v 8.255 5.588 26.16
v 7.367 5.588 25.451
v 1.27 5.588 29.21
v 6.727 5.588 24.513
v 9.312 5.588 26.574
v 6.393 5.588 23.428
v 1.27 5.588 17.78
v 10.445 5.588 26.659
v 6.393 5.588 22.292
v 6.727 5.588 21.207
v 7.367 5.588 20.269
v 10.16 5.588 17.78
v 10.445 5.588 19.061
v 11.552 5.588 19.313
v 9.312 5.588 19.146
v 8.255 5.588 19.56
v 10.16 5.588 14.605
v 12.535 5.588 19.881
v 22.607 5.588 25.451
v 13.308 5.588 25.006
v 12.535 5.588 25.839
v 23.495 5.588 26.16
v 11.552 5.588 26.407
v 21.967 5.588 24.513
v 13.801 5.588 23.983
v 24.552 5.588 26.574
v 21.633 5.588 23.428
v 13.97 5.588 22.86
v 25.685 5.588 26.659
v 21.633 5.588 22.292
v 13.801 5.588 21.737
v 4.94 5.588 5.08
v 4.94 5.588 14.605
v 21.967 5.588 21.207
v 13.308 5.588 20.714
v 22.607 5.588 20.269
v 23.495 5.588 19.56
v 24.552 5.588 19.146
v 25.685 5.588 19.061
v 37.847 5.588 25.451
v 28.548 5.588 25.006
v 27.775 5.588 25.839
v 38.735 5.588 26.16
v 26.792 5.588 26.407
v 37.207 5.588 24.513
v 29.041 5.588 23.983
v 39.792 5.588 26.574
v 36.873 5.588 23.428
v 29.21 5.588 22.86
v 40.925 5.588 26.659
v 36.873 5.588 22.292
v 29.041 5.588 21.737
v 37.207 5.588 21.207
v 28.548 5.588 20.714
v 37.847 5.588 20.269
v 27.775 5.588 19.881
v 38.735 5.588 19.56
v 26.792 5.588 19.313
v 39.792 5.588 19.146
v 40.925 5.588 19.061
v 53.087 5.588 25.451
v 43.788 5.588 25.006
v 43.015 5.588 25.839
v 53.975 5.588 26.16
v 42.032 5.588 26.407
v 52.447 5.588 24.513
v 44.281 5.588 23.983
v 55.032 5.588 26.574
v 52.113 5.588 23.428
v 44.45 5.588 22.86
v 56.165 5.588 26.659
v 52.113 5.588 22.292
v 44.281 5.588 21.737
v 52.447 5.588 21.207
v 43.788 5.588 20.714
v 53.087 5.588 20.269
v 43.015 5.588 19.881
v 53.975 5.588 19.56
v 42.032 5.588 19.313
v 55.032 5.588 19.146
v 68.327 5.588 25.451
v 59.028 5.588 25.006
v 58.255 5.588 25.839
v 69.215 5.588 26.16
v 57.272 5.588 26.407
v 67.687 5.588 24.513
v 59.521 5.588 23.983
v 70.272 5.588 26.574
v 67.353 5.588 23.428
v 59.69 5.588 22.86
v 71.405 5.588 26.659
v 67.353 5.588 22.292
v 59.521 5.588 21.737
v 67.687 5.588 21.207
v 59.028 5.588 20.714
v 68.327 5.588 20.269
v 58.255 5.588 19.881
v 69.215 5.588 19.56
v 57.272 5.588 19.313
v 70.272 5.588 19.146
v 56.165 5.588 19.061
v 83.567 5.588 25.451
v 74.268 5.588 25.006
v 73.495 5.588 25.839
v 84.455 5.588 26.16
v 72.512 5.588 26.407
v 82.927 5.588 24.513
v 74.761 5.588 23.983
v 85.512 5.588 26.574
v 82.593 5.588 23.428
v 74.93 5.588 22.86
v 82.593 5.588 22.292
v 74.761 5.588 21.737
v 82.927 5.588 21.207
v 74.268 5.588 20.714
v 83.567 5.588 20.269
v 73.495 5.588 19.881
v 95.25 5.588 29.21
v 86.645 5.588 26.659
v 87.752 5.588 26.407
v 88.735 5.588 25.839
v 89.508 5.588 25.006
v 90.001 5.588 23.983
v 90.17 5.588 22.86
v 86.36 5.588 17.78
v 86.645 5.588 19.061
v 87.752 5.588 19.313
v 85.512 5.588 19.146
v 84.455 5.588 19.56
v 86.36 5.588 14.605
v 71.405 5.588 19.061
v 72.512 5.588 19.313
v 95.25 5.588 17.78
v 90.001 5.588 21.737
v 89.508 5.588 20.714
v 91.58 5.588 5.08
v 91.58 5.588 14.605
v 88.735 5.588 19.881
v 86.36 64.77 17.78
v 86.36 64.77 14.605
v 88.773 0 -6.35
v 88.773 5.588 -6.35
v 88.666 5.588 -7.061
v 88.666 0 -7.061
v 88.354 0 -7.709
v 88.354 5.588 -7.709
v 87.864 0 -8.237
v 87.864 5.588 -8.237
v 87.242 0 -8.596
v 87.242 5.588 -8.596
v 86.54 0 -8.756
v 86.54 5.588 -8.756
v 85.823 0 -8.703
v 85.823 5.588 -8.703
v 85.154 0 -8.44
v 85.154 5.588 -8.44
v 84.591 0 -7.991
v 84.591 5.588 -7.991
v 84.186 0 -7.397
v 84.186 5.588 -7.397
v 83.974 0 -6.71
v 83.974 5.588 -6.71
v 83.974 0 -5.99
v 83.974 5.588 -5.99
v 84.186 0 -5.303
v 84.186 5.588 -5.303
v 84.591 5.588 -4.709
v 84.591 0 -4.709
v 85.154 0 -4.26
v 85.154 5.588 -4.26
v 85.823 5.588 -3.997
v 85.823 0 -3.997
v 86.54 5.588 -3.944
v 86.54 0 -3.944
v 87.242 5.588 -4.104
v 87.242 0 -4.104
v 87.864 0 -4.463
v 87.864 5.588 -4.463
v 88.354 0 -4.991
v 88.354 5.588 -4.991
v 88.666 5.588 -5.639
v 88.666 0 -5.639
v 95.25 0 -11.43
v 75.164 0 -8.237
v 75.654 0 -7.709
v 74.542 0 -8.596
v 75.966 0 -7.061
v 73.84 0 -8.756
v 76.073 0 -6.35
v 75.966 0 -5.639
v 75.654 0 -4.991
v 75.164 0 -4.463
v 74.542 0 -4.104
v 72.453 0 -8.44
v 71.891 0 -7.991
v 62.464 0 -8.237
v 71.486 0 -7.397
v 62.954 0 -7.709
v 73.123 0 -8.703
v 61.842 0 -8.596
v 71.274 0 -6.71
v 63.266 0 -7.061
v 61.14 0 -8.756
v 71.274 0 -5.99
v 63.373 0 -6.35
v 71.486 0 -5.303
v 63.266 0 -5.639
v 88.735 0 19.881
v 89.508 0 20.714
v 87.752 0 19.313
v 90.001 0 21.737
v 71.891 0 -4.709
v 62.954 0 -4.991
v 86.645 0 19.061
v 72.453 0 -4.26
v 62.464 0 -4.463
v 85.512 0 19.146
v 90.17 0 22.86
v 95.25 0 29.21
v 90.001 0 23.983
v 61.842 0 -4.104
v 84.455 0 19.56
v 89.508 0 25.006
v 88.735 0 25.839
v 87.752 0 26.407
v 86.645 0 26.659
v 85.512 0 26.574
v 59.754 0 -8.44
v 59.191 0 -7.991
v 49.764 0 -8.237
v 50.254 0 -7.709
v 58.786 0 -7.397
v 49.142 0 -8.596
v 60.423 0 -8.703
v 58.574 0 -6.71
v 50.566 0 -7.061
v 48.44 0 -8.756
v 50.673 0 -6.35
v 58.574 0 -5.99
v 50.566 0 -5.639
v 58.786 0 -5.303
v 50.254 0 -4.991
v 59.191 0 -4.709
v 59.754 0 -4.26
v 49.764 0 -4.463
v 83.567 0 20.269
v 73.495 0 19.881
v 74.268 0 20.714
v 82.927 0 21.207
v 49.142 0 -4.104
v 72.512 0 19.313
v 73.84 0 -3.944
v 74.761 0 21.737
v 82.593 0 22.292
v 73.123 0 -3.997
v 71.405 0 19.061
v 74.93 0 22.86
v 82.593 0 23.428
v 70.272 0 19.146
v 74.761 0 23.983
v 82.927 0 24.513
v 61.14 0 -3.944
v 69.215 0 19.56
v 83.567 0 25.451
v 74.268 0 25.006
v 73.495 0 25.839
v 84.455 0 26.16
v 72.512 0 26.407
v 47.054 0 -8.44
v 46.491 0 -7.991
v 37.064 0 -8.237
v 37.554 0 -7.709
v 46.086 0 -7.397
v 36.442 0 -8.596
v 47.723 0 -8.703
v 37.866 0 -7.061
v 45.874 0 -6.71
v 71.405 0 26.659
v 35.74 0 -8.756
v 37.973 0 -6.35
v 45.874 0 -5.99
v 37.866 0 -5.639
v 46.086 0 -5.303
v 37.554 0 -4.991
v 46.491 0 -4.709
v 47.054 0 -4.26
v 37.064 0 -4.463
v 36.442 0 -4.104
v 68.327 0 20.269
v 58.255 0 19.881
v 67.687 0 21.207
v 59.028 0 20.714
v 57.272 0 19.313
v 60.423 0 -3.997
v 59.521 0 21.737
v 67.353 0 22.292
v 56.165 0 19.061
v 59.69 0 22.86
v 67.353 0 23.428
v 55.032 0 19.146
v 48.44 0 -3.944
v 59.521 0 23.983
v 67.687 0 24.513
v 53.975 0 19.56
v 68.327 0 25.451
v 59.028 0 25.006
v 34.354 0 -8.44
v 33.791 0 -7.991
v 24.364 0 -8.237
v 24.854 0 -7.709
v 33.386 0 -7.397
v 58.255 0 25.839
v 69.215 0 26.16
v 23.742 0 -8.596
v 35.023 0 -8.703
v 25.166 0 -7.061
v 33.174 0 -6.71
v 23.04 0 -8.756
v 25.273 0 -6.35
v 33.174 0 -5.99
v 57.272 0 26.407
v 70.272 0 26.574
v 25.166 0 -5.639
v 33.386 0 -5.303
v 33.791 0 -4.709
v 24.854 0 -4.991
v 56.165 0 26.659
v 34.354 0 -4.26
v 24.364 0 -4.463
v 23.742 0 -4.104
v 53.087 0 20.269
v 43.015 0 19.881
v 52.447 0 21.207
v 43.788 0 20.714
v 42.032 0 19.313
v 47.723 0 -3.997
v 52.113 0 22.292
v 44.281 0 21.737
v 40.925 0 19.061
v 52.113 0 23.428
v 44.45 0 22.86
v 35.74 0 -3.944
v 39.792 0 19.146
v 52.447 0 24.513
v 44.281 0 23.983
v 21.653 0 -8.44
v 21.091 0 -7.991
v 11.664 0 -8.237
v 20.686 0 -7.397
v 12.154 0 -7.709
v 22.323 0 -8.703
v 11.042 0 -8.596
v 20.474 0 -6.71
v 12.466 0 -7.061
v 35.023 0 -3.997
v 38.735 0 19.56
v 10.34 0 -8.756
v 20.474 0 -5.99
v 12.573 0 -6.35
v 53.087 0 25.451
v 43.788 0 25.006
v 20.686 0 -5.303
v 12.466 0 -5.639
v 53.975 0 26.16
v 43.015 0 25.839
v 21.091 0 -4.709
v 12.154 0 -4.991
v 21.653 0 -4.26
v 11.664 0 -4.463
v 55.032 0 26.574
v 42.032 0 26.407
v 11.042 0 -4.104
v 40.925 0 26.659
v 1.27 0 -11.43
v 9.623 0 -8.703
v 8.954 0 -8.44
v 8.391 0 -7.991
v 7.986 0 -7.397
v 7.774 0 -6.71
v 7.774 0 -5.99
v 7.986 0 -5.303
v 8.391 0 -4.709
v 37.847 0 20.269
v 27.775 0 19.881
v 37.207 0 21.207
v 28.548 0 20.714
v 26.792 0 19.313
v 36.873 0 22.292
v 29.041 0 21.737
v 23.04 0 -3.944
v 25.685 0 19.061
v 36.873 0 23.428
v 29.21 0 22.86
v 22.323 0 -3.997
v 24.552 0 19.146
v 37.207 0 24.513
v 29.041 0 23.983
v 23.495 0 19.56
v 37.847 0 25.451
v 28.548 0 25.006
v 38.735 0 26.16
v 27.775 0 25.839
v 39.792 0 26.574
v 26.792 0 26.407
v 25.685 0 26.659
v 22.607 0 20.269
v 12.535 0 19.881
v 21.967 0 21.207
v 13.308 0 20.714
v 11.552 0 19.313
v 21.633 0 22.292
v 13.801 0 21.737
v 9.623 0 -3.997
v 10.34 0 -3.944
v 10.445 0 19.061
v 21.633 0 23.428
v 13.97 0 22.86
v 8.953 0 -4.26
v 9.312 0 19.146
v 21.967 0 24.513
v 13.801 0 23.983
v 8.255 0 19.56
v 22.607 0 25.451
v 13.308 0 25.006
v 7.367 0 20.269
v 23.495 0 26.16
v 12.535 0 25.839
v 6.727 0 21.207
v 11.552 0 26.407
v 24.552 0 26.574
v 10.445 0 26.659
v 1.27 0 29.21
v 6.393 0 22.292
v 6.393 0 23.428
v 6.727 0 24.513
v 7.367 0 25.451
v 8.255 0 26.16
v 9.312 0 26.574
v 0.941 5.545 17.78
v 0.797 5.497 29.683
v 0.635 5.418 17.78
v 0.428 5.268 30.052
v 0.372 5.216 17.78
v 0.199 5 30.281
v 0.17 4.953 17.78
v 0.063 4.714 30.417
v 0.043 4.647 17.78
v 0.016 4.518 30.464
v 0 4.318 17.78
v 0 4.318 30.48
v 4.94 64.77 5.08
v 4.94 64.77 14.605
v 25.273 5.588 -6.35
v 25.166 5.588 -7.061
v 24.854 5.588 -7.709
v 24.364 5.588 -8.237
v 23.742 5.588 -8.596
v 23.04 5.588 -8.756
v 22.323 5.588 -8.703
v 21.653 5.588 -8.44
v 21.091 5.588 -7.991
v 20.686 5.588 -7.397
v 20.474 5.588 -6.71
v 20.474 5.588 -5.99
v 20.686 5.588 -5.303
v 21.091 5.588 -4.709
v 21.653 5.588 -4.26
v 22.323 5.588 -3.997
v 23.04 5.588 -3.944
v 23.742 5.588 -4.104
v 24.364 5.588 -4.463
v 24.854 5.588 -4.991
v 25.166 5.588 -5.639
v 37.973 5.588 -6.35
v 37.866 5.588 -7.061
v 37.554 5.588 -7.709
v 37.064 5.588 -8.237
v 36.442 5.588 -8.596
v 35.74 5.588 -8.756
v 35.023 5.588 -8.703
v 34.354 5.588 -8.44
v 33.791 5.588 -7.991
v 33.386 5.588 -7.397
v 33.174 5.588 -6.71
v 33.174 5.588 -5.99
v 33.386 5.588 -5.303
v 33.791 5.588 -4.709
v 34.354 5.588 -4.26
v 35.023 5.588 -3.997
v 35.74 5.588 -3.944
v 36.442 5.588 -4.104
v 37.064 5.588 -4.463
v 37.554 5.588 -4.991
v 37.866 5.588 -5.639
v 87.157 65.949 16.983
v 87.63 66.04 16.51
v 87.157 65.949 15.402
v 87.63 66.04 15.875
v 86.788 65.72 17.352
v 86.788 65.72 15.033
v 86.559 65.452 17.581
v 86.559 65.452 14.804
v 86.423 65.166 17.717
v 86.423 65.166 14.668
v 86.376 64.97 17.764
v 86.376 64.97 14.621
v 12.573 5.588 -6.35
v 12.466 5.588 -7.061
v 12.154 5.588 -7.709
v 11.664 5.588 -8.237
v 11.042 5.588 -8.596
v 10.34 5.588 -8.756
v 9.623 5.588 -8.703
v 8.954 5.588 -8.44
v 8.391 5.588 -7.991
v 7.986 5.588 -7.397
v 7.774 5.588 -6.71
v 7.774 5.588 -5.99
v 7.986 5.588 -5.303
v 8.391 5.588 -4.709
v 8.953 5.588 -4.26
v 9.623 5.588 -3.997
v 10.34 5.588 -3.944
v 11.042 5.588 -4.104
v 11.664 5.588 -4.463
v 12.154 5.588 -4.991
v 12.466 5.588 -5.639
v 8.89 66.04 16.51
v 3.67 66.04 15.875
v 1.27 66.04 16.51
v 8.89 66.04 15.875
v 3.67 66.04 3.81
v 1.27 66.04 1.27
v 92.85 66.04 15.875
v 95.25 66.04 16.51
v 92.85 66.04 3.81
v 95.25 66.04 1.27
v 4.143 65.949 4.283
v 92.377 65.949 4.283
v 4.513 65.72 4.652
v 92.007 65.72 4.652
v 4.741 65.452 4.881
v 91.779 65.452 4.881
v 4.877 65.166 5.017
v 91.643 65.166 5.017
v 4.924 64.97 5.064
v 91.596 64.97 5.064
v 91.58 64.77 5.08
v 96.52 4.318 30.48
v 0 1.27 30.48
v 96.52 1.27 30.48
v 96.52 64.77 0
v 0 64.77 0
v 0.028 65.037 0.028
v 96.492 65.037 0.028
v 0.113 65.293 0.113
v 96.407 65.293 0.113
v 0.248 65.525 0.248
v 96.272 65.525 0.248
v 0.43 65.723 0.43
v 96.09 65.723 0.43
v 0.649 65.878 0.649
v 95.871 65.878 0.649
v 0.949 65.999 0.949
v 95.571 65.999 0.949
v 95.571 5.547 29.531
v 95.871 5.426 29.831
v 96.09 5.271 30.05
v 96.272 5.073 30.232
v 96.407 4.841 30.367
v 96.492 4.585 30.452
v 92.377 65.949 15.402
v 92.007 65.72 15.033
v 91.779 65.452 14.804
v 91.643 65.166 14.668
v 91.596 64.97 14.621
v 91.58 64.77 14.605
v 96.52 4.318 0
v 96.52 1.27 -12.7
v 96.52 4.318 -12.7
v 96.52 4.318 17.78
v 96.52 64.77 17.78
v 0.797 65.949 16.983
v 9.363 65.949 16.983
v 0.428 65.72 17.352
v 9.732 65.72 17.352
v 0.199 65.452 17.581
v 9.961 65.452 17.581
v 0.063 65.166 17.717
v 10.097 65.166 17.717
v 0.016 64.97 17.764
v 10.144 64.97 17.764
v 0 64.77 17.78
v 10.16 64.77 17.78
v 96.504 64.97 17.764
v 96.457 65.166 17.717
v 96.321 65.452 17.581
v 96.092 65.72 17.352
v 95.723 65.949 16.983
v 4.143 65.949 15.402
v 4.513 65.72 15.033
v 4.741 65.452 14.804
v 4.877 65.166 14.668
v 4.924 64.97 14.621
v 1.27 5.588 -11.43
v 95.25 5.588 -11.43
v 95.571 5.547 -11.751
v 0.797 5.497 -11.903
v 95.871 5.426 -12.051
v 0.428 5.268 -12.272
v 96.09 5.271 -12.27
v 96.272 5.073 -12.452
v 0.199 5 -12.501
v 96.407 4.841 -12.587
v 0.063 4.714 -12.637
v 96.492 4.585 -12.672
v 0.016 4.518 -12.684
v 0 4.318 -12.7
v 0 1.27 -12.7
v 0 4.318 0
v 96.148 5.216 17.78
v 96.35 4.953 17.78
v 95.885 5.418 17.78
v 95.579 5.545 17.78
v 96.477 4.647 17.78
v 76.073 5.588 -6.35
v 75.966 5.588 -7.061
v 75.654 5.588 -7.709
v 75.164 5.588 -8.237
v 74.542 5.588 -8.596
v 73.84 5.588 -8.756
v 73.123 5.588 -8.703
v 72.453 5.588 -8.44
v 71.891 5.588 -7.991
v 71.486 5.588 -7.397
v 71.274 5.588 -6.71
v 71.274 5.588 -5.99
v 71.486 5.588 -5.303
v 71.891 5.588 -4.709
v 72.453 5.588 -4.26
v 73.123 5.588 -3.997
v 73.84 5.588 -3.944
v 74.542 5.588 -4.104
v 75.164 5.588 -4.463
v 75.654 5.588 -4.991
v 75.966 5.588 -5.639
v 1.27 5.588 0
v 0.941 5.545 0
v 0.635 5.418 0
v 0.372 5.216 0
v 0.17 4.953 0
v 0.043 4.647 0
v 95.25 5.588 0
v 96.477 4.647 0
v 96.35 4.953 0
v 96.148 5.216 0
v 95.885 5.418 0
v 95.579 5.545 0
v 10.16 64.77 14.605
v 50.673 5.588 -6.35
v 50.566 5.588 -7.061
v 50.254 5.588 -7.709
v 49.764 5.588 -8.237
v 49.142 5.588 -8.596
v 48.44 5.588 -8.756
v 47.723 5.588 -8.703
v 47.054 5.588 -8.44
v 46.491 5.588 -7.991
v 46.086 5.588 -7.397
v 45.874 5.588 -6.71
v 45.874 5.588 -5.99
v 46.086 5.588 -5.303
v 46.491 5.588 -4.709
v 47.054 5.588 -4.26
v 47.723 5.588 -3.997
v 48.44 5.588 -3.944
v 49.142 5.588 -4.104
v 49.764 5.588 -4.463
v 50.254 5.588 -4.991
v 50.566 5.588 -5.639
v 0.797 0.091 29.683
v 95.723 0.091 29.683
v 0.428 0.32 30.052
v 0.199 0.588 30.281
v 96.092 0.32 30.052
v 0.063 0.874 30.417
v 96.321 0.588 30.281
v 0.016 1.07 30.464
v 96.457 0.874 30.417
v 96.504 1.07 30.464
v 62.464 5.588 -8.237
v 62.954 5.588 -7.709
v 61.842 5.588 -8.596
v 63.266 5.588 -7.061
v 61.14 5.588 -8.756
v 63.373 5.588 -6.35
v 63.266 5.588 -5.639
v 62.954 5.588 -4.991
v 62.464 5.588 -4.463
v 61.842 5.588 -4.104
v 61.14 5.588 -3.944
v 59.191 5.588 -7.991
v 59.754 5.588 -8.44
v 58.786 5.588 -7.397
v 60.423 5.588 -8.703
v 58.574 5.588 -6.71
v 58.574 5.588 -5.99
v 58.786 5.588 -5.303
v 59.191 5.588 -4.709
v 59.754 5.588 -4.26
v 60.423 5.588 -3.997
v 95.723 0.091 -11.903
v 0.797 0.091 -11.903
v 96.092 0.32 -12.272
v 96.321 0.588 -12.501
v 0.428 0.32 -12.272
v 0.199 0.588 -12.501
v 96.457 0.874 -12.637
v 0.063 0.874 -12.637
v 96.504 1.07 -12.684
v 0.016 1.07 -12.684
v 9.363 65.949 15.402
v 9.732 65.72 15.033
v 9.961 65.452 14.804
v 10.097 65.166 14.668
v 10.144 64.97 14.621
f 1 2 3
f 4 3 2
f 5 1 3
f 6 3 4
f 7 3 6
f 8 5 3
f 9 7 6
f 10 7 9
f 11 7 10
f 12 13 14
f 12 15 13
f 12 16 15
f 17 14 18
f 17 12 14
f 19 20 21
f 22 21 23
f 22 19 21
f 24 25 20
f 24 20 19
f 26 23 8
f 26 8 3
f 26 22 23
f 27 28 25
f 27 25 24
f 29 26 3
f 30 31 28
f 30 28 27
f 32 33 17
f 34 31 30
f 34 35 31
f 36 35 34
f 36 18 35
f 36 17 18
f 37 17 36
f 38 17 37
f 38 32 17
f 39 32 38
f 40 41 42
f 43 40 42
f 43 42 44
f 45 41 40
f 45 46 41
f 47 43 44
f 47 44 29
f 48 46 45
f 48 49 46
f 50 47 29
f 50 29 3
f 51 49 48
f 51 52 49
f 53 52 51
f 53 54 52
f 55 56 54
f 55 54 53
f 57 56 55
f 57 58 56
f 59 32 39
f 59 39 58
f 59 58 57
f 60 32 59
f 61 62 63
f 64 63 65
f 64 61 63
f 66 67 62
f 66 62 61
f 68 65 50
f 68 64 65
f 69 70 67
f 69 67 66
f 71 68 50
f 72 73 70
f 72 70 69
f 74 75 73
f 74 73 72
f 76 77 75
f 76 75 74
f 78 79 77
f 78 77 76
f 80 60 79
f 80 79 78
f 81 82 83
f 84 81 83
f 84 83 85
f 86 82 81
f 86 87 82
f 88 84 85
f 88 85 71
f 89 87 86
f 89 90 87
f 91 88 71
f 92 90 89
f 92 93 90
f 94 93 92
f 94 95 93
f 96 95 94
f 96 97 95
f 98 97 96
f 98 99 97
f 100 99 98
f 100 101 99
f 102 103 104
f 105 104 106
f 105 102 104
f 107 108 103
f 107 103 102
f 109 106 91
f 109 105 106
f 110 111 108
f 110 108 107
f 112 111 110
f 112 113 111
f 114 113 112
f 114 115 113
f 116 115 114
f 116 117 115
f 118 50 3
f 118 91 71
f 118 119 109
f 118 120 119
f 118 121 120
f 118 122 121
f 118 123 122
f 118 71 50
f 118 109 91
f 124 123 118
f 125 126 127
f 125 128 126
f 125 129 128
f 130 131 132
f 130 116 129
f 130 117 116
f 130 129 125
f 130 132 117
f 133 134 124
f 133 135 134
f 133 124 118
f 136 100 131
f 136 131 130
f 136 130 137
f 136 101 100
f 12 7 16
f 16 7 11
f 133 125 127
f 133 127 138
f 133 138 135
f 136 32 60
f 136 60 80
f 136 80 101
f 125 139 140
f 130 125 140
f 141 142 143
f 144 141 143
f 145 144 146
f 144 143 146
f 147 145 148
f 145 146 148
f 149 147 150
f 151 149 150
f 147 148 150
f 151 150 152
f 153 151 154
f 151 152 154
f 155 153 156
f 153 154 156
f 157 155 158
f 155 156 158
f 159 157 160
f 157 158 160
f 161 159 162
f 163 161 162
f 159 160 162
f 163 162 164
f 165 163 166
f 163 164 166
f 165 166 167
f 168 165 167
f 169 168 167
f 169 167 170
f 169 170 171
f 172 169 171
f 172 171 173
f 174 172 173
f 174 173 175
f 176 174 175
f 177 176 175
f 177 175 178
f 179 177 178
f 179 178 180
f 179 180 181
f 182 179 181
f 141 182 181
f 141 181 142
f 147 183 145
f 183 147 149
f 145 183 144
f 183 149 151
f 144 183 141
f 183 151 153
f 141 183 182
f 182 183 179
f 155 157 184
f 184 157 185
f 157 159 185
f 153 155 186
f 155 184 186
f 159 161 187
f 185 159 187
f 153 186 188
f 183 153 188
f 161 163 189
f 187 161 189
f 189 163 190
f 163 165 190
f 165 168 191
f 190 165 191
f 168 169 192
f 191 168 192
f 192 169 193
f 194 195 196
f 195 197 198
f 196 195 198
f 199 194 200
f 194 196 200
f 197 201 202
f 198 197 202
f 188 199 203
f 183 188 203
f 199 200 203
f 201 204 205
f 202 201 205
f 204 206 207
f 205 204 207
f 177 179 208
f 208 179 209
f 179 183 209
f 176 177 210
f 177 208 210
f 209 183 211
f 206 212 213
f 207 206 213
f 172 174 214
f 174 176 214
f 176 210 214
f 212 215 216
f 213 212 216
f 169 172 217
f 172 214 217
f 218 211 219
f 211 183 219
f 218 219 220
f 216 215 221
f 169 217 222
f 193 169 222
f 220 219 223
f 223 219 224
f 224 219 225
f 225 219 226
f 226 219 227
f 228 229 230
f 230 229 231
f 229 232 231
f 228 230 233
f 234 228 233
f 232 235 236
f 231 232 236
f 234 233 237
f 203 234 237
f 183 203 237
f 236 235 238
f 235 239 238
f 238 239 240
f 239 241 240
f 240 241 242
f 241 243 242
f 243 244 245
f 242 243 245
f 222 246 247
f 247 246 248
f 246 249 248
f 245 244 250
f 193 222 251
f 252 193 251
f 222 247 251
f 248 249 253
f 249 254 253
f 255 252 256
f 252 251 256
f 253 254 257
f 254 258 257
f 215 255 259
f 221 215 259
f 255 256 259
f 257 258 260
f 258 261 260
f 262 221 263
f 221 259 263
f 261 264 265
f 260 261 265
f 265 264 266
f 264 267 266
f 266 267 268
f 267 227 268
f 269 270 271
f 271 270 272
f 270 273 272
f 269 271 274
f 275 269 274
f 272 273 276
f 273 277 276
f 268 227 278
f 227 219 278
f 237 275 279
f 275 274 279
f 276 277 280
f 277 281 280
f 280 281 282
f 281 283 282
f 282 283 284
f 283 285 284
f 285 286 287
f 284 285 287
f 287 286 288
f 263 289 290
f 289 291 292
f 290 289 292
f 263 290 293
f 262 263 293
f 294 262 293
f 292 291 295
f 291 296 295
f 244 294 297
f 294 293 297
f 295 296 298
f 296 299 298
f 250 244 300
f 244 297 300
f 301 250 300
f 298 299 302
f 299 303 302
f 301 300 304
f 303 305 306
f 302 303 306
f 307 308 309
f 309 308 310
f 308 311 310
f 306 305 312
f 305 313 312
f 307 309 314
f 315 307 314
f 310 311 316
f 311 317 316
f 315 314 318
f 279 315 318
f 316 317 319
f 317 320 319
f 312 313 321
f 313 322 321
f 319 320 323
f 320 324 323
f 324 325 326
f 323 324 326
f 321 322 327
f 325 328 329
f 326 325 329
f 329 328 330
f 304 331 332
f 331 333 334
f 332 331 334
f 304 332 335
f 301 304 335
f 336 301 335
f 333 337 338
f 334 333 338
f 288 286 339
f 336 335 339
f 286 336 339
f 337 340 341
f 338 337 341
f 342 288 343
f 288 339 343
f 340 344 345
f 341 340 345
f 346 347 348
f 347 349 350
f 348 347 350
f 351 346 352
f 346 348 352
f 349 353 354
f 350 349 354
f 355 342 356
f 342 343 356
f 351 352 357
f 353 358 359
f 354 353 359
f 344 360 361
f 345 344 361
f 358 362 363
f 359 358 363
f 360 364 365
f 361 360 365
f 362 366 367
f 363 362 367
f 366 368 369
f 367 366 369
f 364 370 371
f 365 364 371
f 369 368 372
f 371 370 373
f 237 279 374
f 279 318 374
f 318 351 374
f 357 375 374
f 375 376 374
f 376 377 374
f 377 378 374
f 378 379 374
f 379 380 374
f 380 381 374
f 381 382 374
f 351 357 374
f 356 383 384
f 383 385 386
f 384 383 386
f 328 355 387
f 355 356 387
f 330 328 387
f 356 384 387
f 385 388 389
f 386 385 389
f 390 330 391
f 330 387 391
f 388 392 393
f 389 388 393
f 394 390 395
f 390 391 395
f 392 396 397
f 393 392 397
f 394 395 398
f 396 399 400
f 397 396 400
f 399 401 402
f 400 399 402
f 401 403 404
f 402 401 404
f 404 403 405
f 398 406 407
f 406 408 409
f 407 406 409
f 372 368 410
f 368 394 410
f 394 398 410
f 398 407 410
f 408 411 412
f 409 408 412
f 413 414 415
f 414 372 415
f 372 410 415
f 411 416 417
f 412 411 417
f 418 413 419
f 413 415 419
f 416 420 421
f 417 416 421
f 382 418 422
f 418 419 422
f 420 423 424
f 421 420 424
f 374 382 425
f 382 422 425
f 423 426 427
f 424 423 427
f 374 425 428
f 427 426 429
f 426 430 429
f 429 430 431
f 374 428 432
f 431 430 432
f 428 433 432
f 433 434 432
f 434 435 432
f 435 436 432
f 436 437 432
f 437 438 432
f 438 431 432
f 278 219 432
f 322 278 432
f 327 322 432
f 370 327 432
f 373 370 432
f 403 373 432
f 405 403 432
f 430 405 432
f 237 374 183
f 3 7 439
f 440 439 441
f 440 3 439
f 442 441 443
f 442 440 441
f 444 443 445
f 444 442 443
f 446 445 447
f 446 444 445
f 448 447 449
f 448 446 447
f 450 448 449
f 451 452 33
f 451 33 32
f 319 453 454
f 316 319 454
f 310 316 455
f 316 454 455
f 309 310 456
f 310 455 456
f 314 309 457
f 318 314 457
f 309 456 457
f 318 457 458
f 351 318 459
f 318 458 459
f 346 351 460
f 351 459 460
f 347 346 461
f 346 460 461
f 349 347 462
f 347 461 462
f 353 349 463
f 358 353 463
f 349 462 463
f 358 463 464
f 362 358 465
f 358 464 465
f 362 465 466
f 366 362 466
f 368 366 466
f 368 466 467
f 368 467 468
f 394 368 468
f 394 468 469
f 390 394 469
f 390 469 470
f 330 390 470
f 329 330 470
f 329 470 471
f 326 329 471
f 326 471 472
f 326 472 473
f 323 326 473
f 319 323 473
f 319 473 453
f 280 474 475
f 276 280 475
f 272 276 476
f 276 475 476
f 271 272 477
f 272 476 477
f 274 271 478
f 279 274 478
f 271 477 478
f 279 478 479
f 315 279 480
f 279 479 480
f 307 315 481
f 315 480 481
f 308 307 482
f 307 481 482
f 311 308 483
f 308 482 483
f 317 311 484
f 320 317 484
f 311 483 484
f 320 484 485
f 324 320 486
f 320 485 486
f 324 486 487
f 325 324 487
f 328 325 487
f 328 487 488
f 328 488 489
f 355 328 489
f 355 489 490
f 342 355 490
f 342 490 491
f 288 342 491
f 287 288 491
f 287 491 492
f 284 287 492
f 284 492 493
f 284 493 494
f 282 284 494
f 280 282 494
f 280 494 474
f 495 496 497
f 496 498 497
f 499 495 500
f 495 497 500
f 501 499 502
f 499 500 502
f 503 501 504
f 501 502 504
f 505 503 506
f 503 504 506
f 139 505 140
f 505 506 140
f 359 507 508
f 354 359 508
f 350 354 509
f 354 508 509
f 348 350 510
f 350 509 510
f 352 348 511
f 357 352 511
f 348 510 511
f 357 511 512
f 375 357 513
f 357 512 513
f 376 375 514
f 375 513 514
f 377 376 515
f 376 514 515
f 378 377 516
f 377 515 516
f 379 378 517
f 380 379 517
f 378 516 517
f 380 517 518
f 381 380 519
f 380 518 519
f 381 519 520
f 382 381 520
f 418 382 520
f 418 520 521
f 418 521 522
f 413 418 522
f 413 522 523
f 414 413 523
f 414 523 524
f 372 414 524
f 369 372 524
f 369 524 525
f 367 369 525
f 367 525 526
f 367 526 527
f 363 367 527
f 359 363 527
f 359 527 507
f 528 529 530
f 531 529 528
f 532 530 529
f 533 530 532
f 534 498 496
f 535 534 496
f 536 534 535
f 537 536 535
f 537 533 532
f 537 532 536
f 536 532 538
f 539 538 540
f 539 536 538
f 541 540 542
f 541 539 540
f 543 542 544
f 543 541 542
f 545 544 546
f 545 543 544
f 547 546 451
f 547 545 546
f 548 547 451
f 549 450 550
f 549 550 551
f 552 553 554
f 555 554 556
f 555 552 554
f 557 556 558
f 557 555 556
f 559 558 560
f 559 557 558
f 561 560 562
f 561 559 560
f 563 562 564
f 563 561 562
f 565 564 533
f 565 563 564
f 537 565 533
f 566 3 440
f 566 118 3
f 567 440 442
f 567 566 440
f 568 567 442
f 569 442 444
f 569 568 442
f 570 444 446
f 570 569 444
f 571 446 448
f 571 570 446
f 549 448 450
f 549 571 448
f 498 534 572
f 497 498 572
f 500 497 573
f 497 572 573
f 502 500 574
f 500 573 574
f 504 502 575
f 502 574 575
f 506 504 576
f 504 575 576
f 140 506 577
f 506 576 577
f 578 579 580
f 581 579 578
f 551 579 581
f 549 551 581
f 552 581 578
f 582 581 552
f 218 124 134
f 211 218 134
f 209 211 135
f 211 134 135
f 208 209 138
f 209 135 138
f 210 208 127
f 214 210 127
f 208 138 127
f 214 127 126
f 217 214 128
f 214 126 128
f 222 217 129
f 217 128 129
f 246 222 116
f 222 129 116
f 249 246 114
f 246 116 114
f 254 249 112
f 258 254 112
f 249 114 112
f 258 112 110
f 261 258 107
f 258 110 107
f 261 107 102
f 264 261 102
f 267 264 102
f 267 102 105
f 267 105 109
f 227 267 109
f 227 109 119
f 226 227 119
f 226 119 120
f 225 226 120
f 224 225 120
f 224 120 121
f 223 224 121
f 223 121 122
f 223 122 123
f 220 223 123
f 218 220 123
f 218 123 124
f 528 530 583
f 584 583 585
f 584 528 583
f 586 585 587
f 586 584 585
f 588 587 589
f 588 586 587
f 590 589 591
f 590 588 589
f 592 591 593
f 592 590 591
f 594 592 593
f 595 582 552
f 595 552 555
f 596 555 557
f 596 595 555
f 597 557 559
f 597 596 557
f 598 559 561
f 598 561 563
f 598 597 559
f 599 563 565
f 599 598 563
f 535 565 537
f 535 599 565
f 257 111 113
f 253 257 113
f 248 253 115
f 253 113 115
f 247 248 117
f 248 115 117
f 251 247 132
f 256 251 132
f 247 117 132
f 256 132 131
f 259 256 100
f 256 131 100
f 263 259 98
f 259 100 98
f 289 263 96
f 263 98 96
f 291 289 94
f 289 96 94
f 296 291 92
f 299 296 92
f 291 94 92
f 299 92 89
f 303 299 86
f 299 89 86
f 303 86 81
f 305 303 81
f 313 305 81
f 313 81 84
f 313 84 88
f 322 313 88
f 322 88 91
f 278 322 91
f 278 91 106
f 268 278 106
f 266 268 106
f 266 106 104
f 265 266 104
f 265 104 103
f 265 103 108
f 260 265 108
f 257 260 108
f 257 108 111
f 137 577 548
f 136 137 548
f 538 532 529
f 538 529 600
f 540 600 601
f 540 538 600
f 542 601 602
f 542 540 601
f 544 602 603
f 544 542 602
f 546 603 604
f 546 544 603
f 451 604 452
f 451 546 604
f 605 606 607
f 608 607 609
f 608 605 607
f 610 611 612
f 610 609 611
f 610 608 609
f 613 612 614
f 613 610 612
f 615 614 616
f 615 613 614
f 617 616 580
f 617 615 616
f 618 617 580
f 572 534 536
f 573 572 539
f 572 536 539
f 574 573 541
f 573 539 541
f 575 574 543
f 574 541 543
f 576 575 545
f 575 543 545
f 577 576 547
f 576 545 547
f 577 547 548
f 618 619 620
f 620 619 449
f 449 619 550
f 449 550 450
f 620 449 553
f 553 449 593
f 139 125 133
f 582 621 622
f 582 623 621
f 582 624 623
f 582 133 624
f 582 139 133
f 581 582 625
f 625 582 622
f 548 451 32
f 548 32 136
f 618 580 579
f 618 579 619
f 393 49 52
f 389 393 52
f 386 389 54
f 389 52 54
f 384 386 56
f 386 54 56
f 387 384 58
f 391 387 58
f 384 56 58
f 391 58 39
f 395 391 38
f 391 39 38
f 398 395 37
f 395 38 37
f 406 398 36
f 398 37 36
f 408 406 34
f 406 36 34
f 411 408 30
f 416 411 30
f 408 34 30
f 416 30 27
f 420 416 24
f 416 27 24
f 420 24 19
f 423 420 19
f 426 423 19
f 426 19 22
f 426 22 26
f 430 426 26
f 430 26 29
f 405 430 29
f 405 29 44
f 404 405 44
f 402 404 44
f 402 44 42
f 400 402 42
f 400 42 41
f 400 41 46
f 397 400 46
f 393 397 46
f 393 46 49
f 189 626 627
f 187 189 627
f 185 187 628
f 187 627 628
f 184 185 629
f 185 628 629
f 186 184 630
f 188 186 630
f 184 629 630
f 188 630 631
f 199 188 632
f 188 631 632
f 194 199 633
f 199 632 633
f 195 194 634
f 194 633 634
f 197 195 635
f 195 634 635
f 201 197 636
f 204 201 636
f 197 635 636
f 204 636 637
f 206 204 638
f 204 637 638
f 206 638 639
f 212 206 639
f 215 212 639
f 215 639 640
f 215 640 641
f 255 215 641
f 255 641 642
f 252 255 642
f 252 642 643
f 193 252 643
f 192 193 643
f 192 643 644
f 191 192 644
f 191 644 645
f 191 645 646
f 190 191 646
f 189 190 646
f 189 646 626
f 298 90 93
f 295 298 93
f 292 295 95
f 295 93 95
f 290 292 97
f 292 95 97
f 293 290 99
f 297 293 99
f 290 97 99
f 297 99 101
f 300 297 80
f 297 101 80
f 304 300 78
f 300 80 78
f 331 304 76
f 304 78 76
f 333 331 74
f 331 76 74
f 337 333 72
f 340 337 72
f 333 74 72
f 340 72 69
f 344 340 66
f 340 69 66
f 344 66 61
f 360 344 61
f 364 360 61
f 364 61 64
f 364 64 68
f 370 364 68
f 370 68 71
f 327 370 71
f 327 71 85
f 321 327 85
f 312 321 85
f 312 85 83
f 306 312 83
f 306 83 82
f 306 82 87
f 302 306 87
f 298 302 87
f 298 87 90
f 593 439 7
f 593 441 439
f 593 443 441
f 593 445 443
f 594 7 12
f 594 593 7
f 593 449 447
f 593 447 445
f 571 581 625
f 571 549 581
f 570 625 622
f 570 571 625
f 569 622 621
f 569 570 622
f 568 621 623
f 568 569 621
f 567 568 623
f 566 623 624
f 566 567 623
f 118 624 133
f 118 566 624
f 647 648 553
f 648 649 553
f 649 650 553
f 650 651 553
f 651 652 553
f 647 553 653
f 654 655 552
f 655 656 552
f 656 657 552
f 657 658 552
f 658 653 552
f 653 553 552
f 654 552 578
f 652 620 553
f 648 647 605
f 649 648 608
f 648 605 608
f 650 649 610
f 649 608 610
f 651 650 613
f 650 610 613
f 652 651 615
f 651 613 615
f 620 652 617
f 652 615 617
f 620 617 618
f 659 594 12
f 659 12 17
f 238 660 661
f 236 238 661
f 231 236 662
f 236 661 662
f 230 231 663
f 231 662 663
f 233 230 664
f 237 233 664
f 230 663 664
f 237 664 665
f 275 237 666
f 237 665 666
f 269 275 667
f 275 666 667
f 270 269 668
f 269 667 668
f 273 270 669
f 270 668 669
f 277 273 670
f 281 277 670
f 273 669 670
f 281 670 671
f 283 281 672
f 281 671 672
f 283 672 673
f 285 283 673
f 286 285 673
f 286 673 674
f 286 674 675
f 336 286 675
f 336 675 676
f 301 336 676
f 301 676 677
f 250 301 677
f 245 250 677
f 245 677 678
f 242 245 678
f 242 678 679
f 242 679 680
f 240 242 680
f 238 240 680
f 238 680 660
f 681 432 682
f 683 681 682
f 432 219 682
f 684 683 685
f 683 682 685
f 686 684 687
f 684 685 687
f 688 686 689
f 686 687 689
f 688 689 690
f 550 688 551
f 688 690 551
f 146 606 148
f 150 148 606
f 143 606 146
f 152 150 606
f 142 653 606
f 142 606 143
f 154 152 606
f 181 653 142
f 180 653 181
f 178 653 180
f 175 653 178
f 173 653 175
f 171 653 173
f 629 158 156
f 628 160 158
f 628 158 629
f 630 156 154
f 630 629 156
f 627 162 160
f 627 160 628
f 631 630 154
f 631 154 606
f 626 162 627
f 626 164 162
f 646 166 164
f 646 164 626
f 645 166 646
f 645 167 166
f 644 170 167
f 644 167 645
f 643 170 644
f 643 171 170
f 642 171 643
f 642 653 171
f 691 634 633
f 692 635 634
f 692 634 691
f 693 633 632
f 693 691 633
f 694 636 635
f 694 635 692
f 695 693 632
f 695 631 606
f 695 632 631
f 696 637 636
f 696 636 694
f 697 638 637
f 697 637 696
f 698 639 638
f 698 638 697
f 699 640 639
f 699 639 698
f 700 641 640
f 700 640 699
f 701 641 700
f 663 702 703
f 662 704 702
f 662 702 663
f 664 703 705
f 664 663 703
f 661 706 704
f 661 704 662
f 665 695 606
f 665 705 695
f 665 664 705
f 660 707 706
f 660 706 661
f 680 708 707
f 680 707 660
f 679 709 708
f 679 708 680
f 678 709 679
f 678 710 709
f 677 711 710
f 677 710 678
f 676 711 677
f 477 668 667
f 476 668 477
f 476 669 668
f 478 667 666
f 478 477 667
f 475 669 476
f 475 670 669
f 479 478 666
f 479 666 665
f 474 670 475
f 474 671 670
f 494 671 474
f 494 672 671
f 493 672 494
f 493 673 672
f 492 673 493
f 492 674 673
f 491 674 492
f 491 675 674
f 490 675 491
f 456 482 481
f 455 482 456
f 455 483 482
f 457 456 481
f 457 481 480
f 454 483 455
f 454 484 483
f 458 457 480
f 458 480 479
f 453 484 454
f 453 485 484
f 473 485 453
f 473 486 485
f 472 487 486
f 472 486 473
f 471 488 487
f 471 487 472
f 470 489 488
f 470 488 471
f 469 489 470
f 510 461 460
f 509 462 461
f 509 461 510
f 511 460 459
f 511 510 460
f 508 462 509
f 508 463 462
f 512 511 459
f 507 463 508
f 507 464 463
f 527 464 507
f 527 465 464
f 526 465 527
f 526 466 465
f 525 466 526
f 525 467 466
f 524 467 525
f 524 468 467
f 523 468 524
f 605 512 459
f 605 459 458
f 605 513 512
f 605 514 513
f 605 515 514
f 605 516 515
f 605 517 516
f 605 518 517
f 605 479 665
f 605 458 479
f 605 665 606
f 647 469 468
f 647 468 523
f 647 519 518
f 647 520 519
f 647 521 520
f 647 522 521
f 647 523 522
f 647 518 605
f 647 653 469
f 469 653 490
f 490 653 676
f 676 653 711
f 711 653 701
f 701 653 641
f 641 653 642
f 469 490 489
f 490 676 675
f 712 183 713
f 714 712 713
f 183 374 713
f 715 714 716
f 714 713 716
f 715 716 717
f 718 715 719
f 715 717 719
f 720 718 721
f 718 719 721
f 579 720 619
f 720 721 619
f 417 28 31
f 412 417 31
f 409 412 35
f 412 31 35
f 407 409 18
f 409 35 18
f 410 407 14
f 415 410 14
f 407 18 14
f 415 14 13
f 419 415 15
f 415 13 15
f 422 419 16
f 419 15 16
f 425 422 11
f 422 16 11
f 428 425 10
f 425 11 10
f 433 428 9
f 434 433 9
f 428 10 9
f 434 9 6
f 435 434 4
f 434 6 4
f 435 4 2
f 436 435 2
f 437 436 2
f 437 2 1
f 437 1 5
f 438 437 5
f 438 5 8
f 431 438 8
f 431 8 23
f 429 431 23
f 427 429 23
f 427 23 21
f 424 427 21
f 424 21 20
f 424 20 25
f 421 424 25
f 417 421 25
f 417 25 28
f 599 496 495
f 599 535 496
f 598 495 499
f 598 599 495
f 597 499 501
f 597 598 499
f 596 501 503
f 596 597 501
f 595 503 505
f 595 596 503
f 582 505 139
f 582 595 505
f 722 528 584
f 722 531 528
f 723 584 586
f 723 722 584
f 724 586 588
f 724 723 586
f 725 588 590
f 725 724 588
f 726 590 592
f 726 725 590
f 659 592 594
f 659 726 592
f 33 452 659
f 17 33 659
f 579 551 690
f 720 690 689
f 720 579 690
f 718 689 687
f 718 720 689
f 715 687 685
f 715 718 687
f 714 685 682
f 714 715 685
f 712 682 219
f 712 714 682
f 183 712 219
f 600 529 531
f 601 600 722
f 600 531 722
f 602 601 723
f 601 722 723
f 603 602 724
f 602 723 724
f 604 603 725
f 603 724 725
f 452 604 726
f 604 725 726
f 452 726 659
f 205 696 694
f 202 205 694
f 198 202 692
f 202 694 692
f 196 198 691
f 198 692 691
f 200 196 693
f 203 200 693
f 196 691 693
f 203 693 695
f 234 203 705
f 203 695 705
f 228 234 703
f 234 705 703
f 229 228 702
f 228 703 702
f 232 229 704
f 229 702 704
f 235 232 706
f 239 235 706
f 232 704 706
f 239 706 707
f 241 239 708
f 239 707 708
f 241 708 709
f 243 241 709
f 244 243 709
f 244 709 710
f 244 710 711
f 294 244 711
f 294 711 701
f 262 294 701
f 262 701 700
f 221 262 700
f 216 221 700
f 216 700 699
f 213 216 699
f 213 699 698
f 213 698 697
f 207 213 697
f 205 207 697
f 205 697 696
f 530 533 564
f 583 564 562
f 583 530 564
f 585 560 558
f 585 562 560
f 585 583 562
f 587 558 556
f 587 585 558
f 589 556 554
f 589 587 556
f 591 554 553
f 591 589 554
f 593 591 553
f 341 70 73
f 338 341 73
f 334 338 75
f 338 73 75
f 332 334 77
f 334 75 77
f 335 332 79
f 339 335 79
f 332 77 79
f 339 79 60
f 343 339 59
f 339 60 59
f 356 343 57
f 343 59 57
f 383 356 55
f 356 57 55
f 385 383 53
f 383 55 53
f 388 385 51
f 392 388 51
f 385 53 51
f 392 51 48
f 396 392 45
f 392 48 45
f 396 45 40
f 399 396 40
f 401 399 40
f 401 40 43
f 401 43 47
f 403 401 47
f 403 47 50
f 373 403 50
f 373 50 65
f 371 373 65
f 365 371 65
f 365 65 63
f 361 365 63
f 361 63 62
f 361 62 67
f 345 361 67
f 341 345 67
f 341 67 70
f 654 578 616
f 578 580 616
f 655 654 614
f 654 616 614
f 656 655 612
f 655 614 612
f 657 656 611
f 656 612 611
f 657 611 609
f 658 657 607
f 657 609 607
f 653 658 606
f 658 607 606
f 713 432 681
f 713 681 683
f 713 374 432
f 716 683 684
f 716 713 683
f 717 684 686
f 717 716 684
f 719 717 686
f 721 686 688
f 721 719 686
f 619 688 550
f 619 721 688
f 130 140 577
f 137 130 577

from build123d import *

# Parameters (mm, degrees)
SKETCH2_W           = 96.52
SKETCH2_H           = 66.04
BOSS_EXTRUDE1_DEPTH = 17.78
SKETCH3_W           = 96.52
SKETCH3_H           = 5.588
BOSS_EXTRUDE2_DEPTH = 12.7
SKETCH4_W           = 86.6394
SKETCH4_H           = 9.525
SKETCH4_W_2         = 76.2
SKETCH4_H_2         = 3.175
CUT_EXTRUDE1_DEPTH  = 60.452
SKETCH5_W           = 96.52
SKETCH5_H           = 5.588
BOSS_EXTRUDE3_DEPTH = 12.7
SKETCH6_R           = 2.413
SKETCH6_R_2         = 3.81
CUT_EXTRUDE2_DEPTH  = 6.588
FILLET1_R           = 1.27
FILLET2_R           = 1.27
FILLET3_R           = 1.27


with BuildPart() as part:
    # Sketch2 → Boss-Extrude1 (new body)
    with BuildSketch(Plane.XY):
        with Locations((48.26, 33.02)):
            Rectangle(SKETCH2_W, SKETCH2_H)
    extrude(amount=BOSS_EXTRUDE1_DEPTH)

    # Sketch3 → Boss-Extrude2 (add)
    with BuildSketch(Plane.XY.offset(17.78)):
        with Locations((48.26, 2.794)):
            Rectangle(SKETCH3_W, SKETCH3_H)
    extrude(amount=BOSS_EXTRUDE2_DEPTH)

    # Sketch4 → Cut-Extrude1 (cut)
    with BuildSketch(Plane(origin=(0, 66.04, 0), x_dir=(1, 0, 0), z_dir=(0, 1, 0))):
        with Locations((48.26, -9.8425)):
            Rectangle(SKETCH4_W, SKETCH4_H)
        with Locations((48.26, -16.1925)):
            Rectangle(SKETCH4_W_2, SKETCH4_H_2)
    extrude(amount=-CUT_EXTRUDE1_DEPTH, mode=Mode.SUBTRACT)

    # Sketch5 → Boss-Extrude3 (add)
    with BuildSketch(Plane(origin=(0, 0, 0), x_dir=(-1, 0, 0), z_dir=(0, 0, -1))):
        with Locations((-48.26, 2.794)):
            Rectangle(SKETCH5_W, SKETCH5_H)
    extrude(amount=BOSS_EXTRUDE3_DEPTH)

    # Sketch6 → Cut-Extrude2 (cut, through all)
    with BuildSketch(Plane(origin=(0, 5.588, 0), x_dir=(1, 0, 0), z_dir=(0, 1, 0))):
        with Locations((10.16, 6.35)):
            Circle(SKETCH6_R)
        with Locations((22.86, 6.35)):
            Circle(SKETCH6_R)
        with Locations((35.56, 6.35)):
            Circle(SKETCH6_R)
        with Locations((48.26, 6.35)):
            Circle(SKETCH6_R)
        with Locations((60.96, 6.35)):
            Circle(SKETCH6_R)
        with Locations((73.66, 6.35)):
            Circle(SKETCH6_R)
        with Locations((86.36, 6.35)):
            Circle(SKETCH6_R)
        with Locations((10.16, -22.86)):
            Circle(SKETCH6_R_2)
        with Locations((25.4, -22.86)):
            Circle(SKETCH6_R_2)
        with Locations((40.64, -22.86)):
            Circle(SKETCH6_R_2)
        with Locations((55.88, -22.86)):
            Circle(SKETCH6_R_2)
        with Locations((71.12, -22.86)):
            Circle(SKETCH6_R_2)
        with Locations((86.36, -22.86)):
            Circle(SKETCH6_R_2)
    extrude(amount=-CUT_EXTRUDE2_DEPTH, mode=Mode.SUBTRACT)

    # Fillet1
    fillet1_edges = [part.edges().sort_by_distance(p)[0] for p in [
        (91.44, 66.04, 17.78),
        (5.08, 66.04, 17.78),
        (91.5797, 66.04, 9.8425),
        (48.26, 66.04, 5.08),
        (4.9403, 66.04, 9.8425),
        (7.55015, 66.04, 14.605),
        (10.16, 66.04, 16.1925),
        (88.96985, 66.04, 14.605),
        (86.36, 66.04, 16.1925),
        (48.26, 66.04, 0),
        (0, 66.04, 8.89),
        (96.52, 66.04, 8.89),
    ]]
    fillet(fillet1_edges, radius=FILLET1_R)

    # Fillet2
    fillet2_edges = [part.edges().sort_by_distance(p)[0] for p in [
        (0, 5.588, 24.13),
        (96.52, 5.588, 24.13),
        (48.26, 5.588, 30.48),
        (96.52, 5.588, -6.35),
        (0, 5.588, -6.35),
        (48.26, 5.588, -12.7),
    ]]
    fillet(fillet2_edges, radius=FILLET2_R)

    # Fillet3
    fillet3_edges = [part.edges().sort_by_distance(p)[0] for p in [
        (48.26, 0, 30.48),
        (48.26, 0, -12.7),
        (96.52, 0, 8.89),
        (0, 0, 8.89),
    ]]
    fillet(fillet3_edges, radius=FILLET3_R)


solid = part.part
